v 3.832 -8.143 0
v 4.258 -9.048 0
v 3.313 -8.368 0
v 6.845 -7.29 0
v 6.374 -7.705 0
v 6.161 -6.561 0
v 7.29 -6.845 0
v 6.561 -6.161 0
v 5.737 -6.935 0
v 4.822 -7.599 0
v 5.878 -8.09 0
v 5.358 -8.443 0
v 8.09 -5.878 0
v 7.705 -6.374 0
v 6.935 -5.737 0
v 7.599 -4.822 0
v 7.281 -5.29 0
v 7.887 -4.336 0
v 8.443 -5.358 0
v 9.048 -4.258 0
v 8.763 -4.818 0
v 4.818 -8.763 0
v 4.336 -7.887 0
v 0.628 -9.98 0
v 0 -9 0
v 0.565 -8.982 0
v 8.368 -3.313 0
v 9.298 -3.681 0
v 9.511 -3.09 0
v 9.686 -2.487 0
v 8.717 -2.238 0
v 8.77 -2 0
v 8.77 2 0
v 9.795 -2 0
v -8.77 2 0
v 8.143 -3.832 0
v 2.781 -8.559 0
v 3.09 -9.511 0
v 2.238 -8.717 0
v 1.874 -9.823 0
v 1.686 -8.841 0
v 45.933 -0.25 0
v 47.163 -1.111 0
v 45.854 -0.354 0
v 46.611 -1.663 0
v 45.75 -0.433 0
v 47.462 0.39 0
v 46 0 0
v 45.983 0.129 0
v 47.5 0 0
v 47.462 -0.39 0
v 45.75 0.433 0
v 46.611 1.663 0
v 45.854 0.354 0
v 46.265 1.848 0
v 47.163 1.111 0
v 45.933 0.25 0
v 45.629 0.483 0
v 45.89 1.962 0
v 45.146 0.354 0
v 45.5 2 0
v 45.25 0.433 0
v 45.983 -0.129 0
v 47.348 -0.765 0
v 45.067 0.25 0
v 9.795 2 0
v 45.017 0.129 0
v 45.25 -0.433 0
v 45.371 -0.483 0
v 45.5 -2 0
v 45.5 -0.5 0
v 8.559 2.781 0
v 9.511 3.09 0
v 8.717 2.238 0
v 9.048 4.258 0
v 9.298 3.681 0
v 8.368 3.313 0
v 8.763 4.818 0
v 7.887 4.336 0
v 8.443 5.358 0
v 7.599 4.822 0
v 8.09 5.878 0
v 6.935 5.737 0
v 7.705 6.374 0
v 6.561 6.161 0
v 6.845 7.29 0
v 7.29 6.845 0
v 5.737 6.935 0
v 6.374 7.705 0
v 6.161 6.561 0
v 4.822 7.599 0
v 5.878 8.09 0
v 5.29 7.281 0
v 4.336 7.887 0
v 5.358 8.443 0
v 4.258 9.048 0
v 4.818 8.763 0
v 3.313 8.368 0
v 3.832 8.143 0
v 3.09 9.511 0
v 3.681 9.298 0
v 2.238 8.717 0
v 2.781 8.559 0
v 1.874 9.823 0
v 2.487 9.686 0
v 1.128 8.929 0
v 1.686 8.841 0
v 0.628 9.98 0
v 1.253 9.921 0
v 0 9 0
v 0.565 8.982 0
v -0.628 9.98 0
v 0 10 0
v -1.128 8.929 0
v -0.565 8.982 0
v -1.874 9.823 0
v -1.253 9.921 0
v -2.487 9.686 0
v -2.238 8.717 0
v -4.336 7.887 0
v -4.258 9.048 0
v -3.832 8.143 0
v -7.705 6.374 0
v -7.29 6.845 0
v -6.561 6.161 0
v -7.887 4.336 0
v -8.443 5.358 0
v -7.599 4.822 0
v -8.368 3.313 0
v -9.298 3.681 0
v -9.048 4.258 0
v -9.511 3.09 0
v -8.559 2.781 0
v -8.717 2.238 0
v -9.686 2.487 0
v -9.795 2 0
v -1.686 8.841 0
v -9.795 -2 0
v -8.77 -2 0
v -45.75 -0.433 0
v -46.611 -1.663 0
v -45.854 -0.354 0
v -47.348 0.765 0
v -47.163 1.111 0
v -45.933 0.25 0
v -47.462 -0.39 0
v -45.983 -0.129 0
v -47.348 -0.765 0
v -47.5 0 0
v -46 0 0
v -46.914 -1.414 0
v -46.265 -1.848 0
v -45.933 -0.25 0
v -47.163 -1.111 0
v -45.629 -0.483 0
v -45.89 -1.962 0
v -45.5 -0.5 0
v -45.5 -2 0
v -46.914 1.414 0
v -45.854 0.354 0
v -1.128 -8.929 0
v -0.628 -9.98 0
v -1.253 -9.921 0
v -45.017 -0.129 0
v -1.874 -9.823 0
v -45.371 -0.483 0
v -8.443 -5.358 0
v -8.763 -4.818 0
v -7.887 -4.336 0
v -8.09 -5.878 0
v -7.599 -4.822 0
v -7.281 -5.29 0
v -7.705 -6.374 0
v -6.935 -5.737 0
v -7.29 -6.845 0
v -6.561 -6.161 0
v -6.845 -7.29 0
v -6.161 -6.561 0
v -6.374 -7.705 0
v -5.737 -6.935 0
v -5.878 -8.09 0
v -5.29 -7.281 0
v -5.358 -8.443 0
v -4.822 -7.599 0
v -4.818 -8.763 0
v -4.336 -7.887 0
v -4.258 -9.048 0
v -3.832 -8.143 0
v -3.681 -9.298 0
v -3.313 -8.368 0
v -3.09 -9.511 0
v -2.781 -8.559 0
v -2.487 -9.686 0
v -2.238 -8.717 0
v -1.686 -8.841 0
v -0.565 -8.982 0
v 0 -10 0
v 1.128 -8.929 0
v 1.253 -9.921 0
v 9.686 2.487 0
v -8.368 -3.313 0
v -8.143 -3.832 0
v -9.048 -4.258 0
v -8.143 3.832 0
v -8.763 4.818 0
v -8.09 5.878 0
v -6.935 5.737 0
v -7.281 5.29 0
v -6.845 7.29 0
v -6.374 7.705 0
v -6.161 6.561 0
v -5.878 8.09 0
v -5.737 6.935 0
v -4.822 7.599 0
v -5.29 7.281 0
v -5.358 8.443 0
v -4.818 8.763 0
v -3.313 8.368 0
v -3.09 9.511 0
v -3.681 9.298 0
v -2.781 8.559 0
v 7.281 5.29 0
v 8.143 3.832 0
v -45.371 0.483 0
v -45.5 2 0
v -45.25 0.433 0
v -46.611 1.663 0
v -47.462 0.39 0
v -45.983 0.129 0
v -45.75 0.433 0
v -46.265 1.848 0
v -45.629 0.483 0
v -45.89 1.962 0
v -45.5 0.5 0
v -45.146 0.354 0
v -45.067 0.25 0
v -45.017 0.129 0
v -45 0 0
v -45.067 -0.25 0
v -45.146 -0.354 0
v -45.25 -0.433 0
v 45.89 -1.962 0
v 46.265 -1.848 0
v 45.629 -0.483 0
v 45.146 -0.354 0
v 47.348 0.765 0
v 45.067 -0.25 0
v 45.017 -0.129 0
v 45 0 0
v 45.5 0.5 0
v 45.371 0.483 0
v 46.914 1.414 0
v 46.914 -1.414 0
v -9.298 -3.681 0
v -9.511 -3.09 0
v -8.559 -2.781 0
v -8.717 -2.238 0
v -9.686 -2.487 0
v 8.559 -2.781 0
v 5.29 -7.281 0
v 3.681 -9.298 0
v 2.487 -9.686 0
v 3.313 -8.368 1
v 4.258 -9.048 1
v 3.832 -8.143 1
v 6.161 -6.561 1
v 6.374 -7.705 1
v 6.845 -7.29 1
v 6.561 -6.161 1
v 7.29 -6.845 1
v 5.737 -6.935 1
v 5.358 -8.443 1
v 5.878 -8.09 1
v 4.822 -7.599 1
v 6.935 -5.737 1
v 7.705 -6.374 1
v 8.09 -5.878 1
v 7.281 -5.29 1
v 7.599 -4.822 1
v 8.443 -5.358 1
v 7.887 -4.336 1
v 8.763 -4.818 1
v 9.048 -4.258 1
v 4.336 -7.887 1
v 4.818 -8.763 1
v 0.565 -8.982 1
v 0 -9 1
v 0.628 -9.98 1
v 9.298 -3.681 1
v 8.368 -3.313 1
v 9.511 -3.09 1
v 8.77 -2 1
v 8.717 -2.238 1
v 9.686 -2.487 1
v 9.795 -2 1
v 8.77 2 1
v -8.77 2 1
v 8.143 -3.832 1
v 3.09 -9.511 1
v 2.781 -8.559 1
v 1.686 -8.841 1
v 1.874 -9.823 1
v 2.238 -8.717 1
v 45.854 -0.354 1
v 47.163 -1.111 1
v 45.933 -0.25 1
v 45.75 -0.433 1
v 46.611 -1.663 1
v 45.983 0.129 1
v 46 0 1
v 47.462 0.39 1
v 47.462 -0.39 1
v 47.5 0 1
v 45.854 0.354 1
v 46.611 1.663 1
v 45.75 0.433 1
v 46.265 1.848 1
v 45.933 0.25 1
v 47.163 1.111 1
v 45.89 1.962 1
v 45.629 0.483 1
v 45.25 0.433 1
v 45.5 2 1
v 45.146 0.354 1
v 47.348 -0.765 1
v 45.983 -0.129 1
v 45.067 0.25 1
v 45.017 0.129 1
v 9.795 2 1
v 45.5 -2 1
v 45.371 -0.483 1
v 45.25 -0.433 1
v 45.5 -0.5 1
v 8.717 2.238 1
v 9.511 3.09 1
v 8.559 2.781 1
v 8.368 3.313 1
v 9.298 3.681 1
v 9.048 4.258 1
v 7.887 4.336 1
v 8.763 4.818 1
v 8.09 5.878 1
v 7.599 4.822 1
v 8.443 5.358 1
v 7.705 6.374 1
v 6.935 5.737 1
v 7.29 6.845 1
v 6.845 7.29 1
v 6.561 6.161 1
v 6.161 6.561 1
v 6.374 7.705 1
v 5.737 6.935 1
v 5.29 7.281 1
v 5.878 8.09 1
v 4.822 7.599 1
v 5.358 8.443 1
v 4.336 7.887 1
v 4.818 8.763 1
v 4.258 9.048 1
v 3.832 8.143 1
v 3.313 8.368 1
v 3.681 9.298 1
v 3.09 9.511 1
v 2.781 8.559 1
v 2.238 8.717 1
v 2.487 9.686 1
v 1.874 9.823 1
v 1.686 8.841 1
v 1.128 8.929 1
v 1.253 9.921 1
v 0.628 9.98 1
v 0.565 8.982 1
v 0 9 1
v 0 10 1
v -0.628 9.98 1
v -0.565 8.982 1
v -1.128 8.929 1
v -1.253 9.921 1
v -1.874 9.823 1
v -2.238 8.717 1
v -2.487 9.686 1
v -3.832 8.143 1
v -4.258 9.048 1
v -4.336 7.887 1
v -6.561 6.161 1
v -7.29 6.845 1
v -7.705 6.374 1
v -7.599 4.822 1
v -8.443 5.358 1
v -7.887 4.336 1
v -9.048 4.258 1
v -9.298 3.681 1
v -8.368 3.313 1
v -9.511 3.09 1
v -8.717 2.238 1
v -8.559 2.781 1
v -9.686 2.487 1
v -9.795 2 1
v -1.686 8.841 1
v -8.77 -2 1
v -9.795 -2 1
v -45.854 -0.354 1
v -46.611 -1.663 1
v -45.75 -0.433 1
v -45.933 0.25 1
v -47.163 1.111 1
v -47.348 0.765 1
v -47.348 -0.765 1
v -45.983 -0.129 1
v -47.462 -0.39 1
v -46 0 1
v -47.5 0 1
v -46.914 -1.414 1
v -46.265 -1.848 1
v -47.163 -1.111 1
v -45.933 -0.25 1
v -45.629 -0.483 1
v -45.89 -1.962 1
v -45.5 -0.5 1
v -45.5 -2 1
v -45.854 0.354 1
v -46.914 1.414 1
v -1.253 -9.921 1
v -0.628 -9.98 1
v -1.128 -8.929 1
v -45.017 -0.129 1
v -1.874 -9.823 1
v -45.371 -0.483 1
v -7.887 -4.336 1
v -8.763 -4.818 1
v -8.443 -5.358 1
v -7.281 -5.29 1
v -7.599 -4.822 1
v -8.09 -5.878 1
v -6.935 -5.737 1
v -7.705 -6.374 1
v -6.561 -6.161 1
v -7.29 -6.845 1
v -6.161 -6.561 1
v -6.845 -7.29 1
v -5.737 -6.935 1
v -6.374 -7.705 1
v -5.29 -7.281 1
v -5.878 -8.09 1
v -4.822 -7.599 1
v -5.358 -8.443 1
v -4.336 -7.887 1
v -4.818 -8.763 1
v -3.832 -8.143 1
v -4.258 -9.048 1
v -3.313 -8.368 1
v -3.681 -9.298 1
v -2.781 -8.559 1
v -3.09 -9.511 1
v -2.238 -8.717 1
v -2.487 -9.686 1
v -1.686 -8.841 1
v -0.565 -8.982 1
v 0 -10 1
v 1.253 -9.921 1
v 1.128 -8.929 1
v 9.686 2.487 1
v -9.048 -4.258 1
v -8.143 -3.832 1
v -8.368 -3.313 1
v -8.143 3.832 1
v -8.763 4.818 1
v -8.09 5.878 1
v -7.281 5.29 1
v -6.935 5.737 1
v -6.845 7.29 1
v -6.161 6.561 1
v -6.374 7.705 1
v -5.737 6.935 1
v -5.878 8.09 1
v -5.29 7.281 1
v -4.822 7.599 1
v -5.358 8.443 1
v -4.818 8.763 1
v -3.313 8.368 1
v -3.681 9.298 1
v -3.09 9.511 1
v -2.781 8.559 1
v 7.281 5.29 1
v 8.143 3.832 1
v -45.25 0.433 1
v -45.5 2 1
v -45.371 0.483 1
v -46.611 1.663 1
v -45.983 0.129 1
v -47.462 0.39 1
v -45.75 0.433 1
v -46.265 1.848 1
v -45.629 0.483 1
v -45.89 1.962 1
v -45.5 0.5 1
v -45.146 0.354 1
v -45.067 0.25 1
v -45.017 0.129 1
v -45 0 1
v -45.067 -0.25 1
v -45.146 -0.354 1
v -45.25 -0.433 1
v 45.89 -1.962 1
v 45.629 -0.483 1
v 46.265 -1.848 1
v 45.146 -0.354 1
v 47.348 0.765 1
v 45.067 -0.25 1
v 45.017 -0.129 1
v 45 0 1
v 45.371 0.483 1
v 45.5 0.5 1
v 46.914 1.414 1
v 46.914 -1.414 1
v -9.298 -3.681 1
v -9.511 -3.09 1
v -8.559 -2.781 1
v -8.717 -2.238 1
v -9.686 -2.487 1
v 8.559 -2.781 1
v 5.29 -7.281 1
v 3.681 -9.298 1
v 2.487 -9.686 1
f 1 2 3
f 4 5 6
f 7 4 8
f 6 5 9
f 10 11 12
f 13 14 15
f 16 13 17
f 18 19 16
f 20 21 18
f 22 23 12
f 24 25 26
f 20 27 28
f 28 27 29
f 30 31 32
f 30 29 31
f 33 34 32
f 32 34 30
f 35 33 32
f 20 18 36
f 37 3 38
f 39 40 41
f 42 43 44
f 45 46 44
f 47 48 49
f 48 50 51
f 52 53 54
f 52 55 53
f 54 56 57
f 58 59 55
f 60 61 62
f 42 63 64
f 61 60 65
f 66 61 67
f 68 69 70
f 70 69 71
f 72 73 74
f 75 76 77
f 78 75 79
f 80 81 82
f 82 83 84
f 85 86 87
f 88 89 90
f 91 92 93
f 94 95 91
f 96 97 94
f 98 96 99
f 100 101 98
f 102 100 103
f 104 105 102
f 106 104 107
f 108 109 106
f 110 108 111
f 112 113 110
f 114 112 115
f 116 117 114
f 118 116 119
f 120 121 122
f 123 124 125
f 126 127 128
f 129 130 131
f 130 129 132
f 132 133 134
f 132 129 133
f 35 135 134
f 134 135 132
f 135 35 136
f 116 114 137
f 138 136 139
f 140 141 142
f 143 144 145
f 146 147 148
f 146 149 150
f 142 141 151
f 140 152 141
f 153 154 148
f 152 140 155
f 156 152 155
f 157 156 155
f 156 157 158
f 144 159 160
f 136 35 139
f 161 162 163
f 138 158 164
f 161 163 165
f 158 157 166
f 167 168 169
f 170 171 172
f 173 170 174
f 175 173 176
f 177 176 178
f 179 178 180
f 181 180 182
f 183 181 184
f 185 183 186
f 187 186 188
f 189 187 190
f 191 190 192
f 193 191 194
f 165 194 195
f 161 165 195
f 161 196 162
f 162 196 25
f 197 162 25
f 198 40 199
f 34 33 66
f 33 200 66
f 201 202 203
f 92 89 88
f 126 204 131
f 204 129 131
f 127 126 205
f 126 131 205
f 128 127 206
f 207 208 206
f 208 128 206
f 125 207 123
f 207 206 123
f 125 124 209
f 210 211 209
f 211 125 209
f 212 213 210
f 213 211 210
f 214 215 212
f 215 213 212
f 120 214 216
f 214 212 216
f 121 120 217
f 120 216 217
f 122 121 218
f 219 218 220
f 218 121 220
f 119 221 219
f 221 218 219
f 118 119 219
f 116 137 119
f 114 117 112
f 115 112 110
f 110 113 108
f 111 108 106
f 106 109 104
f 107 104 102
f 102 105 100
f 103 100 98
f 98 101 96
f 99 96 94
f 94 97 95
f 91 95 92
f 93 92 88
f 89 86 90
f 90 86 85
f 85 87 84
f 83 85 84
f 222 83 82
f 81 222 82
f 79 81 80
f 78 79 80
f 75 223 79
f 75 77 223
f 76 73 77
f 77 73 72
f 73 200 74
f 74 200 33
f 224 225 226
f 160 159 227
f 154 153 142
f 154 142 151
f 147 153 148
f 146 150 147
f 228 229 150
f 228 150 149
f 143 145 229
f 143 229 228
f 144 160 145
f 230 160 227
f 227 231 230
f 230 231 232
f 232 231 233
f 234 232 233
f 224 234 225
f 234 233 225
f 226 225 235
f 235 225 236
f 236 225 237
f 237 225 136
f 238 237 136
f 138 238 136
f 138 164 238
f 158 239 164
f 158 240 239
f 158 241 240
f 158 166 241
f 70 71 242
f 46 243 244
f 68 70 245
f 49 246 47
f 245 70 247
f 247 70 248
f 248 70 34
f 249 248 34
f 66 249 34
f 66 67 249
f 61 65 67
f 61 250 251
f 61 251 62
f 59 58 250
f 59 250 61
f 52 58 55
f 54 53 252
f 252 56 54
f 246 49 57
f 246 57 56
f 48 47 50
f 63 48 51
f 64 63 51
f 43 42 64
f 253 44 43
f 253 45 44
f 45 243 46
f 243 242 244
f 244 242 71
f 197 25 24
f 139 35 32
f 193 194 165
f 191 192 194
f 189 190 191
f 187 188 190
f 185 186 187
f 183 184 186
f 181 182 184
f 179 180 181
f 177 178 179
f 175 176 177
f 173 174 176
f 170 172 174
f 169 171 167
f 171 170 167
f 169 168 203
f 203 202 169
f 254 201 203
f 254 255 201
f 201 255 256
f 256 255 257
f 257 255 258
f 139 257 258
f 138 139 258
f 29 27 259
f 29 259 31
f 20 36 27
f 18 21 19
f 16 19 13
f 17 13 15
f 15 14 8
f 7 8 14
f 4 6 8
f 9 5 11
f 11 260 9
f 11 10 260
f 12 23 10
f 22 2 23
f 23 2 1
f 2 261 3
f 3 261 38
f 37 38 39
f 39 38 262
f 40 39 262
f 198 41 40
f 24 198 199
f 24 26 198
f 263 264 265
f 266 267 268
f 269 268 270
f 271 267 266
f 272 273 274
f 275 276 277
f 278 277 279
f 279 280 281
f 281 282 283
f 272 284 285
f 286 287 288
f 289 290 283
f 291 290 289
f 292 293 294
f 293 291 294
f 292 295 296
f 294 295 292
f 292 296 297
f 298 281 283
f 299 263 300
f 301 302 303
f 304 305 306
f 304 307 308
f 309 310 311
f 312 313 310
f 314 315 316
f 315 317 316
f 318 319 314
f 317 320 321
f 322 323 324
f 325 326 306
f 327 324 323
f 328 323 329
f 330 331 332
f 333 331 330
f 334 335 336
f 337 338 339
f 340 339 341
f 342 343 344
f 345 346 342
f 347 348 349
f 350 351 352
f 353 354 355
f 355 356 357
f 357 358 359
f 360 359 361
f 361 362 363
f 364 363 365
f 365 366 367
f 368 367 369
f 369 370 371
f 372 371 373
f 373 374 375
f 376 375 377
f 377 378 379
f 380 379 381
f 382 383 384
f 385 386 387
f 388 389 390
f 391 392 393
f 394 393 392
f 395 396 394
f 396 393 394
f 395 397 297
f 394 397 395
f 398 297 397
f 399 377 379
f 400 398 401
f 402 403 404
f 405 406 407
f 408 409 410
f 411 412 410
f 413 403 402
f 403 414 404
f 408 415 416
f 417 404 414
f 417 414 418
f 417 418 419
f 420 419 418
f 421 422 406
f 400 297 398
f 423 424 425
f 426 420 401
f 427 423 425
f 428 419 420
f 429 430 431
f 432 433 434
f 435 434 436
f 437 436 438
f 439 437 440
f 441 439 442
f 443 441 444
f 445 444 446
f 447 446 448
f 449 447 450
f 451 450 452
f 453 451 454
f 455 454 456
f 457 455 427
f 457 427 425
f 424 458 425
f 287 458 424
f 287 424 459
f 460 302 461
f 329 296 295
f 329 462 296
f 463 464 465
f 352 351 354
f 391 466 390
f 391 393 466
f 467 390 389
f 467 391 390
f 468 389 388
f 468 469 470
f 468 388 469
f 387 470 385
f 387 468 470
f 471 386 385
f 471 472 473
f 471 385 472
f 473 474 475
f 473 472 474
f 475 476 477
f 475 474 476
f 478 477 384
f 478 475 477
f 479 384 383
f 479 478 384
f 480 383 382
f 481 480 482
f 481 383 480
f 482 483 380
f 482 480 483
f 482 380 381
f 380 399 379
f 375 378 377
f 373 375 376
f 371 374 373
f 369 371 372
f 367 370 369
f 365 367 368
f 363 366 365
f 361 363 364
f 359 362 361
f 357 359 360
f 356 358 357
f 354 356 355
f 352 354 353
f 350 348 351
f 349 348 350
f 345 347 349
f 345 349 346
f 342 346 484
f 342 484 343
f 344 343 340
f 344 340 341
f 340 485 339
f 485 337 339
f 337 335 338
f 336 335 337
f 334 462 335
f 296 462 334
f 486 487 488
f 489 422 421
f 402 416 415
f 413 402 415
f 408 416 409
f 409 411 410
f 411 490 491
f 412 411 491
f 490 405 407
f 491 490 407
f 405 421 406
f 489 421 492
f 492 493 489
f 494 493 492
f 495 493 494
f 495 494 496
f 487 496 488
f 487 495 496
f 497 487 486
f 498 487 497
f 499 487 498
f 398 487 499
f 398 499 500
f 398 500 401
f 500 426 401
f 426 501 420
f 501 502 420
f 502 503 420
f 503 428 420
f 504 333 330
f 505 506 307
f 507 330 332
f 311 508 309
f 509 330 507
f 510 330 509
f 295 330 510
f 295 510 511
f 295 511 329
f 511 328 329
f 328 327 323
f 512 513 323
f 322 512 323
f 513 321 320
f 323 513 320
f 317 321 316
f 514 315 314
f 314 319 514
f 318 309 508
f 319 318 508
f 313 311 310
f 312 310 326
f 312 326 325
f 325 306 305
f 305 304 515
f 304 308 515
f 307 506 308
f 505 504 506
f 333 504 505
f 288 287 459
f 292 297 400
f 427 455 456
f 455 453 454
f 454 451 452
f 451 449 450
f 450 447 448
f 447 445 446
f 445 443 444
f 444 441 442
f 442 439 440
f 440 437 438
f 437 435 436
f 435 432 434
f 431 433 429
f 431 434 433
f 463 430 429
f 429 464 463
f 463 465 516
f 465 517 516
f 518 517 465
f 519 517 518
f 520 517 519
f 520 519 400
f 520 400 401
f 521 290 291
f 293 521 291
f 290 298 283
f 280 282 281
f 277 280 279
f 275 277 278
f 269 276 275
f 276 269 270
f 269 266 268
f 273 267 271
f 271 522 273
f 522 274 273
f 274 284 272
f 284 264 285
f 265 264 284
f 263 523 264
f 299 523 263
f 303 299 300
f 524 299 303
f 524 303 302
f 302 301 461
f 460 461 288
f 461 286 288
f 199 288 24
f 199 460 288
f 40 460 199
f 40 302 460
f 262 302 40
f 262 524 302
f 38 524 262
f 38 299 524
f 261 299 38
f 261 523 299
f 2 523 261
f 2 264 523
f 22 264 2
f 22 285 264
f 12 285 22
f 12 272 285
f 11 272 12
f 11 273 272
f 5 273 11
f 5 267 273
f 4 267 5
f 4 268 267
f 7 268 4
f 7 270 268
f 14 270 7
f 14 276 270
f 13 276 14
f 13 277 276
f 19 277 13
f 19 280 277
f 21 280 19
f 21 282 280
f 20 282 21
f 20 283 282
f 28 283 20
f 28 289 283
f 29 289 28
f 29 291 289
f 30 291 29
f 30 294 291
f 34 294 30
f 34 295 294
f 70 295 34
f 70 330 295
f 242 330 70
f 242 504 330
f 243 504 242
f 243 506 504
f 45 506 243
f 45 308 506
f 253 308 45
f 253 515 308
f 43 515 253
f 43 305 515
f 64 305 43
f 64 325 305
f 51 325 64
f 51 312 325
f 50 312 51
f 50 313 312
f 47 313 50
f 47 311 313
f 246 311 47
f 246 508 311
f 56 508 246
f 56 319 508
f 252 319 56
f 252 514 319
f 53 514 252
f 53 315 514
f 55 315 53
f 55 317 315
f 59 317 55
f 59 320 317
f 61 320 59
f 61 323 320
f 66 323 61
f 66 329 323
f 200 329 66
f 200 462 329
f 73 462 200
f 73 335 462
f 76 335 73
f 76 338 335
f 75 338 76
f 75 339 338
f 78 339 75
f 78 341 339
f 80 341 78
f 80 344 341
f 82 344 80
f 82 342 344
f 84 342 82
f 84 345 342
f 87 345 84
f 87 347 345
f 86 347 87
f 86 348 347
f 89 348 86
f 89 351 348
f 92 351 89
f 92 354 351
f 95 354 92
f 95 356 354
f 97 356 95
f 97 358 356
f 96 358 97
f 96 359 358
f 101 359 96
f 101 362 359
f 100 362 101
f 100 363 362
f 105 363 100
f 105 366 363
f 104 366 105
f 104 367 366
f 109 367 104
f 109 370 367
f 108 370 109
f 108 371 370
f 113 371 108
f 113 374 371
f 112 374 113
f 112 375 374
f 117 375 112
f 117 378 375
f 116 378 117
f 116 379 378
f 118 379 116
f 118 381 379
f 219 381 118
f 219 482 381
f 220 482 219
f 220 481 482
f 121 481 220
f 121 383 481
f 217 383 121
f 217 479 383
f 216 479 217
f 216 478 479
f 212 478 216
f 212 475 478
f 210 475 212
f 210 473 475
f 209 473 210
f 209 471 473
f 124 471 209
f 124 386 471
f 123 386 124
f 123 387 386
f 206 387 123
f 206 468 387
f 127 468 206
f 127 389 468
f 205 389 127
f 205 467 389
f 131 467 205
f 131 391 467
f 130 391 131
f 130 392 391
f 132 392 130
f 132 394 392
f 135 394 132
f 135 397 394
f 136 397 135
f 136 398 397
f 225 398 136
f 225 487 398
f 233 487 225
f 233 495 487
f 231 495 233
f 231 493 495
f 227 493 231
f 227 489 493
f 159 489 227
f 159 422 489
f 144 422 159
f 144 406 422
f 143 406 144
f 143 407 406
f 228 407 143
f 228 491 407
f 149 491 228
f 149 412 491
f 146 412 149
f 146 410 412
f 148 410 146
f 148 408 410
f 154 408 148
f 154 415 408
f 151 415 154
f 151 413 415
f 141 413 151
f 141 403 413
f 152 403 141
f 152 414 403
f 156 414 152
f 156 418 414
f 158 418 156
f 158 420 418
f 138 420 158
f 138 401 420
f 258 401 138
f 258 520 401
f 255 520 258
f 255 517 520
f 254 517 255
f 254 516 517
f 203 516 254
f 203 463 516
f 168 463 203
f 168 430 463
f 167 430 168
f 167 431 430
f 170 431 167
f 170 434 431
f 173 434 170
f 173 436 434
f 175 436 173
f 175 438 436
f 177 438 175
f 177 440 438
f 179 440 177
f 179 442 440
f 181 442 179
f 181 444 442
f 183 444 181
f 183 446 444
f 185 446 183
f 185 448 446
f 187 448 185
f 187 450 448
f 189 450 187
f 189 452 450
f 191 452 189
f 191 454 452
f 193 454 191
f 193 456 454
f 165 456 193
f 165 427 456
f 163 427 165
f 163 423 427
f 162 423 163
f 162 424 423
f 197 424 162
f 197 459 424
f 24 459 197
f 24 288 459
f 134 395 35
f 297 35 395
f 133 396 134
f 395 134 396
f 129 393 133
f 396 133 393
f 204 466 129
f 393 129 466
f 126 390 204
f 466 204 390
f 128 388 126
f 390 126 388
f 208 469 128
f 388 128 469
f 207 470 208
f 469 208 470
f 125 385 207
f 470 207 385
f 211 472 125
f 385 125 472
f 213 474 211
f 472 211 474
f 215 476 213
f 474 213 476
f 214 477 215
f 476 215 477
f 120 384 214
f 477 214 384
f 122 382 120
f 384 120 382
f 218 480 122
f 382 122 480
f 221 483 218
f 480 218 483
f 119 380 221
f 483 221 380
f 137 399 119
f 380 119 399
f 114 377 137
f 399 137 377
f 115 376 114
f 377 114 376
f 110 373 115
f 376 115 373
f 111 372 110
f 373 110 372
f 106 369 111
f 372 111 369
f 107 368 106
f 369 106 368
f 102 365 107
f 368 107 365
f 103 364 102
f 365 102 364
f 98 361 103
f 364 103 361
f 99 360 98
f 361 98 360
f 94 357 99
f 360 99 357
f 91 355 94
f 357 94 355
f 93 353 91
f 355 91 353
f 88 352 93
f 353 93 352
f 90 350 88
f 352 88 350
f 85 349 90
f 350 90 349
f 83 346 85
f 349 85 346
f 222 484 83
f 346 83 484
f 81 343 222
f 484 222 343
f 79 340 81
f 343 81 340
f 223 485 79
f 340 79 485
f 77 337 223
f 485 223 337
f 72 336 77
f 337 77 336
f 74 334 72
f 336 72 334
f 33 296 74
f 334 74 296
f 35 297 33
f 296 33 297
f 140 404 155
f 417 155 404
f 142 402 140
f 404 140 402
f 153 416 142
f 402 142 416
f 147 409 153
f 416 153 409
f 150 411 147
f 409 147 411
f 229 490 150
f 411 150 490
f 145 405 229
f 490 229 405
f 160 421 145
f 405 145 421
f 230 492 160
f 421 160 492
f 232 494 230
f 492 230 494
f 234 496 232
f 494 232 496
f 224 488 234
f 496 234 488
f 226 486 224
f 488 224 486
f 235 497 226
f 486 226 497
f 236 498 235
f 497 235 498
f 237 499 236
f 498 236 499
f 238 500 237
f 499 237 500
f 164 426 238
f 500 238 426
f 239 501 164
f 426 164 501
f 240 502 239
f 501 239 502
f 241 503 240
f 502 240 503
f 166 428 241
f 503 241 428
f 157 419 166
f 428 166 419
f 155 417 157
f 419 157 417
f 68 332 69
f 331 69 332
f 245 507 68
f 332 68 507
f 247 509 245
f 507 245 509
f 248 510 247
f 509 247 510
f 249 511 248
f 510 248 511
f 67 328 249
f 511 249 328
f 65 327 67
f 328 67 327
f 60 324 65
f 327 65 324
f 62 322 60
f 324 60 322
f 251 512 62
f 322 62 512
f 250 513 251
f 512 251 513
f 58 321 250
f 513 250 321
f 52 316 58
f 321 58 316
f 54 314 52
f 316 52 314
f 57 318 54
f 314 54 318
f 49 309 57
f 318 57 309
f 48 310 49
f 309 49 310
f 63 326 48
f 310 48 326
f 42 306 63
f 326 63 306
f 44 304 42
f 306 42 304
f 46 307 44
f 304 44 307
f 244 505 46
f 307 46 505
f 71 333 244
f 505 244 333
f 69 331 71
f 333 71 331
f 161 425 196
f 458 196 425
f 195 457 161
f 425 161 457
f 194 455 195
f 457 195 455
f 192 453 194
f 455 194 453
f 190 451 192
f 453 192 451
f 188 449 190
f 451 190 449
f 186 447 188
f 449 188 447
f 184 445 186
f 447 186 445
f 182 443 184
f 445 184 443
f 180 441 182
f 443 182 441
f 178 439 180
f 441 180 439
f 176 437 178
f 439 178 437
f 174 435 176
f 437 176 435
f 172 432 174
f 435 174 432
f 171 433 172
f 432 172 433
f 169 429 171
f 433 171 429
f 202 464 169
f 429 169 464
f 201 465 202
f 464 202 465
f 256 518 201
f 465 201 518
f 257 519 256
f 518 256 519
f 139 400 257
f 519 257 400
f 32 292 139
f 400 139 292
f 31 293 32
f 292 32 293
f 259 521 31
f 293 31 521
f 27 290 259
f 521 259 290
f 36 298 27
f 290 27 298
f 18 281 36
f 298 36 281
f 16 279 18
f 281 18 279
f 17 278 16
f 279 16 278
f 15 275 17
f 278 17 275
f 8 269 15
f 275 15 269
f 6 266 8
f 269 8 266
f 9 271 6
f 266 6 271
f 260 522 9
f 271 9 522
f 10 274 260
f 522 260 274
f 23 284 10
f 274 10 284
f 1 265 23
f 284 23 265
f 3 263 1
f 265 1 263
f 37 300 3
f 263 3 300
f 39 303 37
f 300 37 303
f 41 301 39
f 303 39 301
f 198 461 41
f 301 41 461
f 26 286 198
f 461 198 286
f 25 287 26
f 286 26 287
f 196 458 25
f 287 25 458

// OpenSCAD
// part_id: mar12
// name: Mars pointer arm
// source_drawing_ids: DRW-013
// units: mm
// revision: 0.1
// SPDX-License-Identifier: MIT

module mar12_profile_2d(
    arm_len = 45.5,
    arm_w = 4.0,
    hub_od = 20.0,
    hub_id = 18.0,
    end_hole_d = 1.0
) {
    difference() {
        union() {
            hull() {
                translate([-arm_len, 0]) circle(d = arm_w, $fn = 32);
                circle(d = arm_w, $fn = 32);
            }
            hull() {
                translate([arm_len, 0]) circle(d = arm_w, $fn = 32);
                circle(d = arm_w, $fn = 32);
            }
            difference() {
                circle(d = hub_od, $fn = 100);
                circle(d = hub_id, $fn = 100);
            }
        }
        translate([-arm_len, 0]) circle(d = end_hole_d, $fn = 24);
        translate([arm_len, 0]) circle(d = end_hole_d, $fn = 24);
    }
}

module part_mar12(thickness = 1.0) {
    linear_extrude(height = thickness) mar12_profile_2d();
}

// ---- "main guard" ----
if (is_undef(__LIB_MODE__)) {
    part_mar12();
}
